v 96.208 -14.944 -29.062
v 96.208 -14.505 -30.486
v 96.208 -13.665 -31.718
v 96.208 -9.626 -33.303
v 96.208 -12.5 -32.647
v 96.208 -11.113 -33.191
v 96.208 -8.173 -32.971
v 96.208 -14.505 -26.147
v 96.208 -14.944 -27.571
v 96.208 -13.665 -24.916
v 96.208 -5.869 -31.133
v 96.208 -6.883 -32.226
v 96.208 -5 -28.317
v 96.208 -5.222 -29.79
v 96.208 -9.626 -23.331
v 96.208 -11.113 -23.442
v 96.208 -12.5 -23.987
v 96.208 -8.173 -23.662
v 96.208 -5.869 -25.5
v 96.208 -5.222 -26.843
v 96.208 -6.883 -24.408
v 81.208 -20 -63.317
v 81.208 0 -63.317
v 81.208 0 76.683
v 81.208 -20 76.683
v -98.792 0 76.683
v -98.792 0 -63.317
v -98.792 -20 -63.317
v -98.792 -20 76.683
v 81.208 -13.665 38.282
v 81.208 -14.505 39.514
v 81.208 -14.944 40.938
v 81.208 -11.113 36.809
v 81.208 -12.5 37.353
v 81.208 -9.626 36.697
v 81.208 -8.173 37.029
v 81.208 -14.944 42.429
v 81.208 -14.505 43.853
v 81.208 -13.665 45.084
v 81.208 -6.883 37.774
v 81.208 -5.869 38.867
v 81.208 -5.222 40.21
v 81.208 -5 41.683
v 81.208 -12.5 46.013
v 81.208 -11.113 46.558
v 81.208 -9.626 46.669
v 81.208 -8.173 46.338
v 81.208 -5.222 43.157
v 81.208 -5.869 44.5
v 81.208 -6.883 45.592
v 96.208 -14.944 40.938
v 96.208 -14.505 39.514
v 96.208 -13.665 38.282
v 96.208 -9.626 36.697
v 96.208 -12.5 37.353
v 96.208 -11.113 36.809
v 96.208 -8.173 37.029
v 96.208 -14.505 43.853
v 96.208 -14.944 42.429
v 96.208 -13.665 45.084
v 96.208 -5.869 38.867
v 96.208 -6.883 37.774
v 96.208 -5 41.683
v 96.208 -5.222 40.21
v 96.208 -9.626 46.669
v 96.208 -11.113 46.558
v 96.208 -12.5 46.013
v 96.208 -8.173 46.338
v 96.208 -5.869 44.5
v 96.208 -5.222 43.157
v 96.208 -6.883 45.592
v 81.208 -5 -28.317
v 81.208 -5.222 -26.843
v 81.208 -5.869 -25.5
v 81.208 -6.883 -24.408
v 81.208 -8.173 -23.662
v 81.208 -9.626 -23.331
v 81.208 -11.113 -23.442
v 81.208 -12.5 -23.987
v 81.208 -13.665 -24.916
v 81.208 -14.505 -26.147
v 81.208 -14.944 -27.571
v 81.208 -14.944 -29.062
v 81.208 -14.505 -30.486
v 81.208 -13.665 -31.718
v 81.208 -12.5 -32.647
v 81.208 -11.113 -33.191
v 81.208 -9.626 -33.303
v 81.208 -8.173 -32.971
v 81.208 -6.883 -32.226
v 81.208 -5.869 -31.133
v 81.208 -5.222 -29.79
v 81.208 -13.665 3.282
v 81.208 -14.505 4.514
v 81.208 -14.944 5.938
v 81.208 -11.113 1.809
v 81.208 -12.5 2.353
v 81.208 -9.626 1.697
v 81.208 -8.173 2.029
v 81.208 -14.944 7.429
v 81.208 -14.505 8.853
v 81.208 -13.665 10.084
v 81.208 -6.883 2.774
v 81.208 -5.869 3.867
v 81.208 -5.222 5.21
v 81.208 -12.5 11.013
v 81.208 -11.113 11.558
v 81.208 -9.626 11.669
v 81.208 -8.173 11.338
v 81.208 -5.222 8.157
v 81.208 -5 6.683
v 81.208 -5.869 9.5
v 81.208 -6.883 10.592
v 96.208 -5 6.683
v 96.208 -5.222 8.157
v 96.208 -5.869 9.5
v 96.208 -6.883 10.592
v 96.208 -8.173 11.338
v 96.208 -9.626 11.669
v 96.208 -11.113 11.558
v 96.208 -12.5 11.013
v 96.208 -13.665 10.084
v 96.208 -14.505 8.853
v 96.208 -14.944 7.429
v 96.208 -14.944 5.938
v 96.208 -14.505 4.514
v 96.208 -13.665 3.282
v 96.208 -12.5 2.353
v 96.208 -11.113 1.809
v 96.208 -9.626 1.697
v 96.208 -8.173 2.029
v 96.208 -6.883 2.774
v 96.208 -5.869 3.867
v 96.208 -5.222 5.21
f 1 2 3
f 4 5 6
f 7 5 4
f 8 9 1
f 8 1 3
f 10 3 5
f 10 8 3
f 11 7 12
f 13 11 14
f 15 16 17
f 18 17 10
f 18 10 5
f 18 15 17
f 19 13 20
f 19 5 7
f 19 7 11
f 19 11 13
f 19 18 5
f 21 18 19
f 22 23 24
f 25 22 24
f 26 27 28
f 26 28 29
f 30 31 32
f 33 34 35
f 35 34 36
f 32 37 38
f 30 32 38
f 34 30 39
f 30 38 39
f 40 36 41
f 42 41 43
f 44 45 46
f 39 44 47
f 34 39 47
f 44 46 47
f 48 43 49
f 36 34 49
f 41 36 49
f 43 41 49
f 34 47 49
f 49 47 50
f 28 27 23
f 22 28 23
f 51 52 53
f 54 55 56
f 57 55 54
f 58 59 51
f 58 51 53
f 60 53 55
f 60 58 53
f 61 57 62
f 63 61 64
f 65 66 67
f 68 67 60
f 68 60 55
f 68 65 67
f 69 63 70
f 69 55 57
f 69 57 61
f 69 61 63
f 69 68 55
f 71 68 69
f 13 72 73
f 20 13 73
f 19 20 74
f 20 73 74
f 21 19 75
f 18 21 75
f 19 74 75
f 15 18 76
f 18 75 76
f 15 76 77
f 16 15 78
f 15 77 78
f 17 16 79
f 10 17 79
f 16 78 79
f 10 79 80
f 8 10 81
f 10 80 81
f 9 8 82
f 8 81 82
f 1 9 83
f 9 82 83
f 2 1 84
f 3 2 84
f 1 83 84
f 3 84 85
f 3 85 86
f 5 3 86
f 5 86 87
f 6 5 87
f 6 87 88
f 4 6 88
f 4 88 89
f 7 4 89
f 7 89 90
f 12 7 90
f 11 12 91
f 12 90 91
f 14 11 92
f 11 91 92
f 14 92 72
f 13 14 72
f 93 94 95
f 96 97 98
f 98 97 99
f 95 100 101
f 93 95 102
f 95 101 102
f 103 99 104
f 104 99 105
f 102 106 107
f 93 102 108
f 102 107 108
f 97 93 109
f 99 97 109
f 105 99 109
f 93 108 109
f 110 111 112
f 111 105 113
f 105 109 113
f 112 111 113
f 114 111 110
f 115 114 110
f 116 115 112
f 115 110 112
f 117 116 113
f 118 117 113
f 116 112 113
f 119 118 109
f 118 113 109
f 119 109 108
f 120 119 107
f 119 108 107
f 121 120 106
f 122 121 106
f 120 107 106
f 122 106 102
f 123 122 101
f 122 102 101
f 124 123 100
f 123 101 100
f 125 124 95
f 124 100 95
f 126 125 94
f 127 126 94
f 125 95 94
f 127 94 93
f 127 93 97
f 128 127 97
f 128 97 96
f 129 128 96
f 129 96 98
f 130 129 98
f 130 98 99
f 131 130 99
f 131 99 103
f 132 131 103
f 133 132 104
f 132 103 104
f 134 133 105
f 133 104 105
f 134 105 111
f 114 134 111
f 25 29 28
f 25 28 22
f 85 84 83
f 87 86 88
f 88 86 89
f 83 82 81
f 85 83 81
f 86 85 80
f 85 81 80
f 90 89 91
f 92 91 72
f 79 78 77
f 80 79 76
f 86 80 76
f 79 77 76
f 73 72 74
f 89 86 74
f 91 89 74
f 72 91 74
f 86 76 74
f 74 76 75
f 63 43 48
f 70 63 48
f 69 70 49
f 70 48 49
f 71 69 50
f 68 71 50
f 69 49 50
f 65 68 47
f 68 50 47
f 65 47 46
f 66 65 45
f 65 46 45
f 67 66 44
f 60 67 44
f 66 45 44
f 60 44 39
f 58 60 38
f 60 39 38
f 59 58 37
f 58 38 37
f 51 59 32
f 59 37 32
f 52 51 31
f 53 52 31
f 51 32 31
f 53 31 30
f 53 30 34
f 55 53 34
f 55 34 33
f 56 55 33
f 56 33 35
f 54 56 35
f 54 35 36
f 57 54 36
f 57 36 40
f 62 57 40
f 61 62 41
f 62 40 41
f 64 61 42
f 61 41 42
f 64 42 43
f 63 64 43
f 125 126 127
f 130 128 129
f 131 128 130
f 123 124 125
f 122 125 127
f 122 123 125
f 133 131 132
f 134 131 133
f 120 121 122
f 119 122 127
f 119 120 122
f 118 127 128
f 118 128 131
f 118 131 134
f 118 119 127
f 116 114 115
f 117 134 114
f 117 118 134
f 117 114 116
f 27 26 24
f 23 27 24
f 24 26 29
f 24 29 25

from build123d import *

# Parameters (mm, degrees)
F0_W     = 180
F0_H     = 140
F1_DEPTH = 20
F2_R     = 5
F3_DEPTH = 15


with BuildPart() as f1:
    # F0 (on Front) → F1 (new body)
    with BuildSketch(Plane.XZ):
        with Locations((-8.79214, 6.683301)):
            Rectangle(F0_W, F0_H)
    extrude(amount=F1_DEPTH)


with BuildPart() as f3:
    # F2 (on face) → F3 (new body)
    with BuildSketch(Plane.YZ.offset(81.20786)):
        with Locations((-10, 41.683301)):
            Circle(F2_R)
        with Locations((-10, 6.683301)):
            Circle(F2_R)
        with Locations((-10, -28.316699)):
            Circle(F2_R)
    extrude(amount=F3_DEPTH)


solid = Compound([f1.part, f3.part])
